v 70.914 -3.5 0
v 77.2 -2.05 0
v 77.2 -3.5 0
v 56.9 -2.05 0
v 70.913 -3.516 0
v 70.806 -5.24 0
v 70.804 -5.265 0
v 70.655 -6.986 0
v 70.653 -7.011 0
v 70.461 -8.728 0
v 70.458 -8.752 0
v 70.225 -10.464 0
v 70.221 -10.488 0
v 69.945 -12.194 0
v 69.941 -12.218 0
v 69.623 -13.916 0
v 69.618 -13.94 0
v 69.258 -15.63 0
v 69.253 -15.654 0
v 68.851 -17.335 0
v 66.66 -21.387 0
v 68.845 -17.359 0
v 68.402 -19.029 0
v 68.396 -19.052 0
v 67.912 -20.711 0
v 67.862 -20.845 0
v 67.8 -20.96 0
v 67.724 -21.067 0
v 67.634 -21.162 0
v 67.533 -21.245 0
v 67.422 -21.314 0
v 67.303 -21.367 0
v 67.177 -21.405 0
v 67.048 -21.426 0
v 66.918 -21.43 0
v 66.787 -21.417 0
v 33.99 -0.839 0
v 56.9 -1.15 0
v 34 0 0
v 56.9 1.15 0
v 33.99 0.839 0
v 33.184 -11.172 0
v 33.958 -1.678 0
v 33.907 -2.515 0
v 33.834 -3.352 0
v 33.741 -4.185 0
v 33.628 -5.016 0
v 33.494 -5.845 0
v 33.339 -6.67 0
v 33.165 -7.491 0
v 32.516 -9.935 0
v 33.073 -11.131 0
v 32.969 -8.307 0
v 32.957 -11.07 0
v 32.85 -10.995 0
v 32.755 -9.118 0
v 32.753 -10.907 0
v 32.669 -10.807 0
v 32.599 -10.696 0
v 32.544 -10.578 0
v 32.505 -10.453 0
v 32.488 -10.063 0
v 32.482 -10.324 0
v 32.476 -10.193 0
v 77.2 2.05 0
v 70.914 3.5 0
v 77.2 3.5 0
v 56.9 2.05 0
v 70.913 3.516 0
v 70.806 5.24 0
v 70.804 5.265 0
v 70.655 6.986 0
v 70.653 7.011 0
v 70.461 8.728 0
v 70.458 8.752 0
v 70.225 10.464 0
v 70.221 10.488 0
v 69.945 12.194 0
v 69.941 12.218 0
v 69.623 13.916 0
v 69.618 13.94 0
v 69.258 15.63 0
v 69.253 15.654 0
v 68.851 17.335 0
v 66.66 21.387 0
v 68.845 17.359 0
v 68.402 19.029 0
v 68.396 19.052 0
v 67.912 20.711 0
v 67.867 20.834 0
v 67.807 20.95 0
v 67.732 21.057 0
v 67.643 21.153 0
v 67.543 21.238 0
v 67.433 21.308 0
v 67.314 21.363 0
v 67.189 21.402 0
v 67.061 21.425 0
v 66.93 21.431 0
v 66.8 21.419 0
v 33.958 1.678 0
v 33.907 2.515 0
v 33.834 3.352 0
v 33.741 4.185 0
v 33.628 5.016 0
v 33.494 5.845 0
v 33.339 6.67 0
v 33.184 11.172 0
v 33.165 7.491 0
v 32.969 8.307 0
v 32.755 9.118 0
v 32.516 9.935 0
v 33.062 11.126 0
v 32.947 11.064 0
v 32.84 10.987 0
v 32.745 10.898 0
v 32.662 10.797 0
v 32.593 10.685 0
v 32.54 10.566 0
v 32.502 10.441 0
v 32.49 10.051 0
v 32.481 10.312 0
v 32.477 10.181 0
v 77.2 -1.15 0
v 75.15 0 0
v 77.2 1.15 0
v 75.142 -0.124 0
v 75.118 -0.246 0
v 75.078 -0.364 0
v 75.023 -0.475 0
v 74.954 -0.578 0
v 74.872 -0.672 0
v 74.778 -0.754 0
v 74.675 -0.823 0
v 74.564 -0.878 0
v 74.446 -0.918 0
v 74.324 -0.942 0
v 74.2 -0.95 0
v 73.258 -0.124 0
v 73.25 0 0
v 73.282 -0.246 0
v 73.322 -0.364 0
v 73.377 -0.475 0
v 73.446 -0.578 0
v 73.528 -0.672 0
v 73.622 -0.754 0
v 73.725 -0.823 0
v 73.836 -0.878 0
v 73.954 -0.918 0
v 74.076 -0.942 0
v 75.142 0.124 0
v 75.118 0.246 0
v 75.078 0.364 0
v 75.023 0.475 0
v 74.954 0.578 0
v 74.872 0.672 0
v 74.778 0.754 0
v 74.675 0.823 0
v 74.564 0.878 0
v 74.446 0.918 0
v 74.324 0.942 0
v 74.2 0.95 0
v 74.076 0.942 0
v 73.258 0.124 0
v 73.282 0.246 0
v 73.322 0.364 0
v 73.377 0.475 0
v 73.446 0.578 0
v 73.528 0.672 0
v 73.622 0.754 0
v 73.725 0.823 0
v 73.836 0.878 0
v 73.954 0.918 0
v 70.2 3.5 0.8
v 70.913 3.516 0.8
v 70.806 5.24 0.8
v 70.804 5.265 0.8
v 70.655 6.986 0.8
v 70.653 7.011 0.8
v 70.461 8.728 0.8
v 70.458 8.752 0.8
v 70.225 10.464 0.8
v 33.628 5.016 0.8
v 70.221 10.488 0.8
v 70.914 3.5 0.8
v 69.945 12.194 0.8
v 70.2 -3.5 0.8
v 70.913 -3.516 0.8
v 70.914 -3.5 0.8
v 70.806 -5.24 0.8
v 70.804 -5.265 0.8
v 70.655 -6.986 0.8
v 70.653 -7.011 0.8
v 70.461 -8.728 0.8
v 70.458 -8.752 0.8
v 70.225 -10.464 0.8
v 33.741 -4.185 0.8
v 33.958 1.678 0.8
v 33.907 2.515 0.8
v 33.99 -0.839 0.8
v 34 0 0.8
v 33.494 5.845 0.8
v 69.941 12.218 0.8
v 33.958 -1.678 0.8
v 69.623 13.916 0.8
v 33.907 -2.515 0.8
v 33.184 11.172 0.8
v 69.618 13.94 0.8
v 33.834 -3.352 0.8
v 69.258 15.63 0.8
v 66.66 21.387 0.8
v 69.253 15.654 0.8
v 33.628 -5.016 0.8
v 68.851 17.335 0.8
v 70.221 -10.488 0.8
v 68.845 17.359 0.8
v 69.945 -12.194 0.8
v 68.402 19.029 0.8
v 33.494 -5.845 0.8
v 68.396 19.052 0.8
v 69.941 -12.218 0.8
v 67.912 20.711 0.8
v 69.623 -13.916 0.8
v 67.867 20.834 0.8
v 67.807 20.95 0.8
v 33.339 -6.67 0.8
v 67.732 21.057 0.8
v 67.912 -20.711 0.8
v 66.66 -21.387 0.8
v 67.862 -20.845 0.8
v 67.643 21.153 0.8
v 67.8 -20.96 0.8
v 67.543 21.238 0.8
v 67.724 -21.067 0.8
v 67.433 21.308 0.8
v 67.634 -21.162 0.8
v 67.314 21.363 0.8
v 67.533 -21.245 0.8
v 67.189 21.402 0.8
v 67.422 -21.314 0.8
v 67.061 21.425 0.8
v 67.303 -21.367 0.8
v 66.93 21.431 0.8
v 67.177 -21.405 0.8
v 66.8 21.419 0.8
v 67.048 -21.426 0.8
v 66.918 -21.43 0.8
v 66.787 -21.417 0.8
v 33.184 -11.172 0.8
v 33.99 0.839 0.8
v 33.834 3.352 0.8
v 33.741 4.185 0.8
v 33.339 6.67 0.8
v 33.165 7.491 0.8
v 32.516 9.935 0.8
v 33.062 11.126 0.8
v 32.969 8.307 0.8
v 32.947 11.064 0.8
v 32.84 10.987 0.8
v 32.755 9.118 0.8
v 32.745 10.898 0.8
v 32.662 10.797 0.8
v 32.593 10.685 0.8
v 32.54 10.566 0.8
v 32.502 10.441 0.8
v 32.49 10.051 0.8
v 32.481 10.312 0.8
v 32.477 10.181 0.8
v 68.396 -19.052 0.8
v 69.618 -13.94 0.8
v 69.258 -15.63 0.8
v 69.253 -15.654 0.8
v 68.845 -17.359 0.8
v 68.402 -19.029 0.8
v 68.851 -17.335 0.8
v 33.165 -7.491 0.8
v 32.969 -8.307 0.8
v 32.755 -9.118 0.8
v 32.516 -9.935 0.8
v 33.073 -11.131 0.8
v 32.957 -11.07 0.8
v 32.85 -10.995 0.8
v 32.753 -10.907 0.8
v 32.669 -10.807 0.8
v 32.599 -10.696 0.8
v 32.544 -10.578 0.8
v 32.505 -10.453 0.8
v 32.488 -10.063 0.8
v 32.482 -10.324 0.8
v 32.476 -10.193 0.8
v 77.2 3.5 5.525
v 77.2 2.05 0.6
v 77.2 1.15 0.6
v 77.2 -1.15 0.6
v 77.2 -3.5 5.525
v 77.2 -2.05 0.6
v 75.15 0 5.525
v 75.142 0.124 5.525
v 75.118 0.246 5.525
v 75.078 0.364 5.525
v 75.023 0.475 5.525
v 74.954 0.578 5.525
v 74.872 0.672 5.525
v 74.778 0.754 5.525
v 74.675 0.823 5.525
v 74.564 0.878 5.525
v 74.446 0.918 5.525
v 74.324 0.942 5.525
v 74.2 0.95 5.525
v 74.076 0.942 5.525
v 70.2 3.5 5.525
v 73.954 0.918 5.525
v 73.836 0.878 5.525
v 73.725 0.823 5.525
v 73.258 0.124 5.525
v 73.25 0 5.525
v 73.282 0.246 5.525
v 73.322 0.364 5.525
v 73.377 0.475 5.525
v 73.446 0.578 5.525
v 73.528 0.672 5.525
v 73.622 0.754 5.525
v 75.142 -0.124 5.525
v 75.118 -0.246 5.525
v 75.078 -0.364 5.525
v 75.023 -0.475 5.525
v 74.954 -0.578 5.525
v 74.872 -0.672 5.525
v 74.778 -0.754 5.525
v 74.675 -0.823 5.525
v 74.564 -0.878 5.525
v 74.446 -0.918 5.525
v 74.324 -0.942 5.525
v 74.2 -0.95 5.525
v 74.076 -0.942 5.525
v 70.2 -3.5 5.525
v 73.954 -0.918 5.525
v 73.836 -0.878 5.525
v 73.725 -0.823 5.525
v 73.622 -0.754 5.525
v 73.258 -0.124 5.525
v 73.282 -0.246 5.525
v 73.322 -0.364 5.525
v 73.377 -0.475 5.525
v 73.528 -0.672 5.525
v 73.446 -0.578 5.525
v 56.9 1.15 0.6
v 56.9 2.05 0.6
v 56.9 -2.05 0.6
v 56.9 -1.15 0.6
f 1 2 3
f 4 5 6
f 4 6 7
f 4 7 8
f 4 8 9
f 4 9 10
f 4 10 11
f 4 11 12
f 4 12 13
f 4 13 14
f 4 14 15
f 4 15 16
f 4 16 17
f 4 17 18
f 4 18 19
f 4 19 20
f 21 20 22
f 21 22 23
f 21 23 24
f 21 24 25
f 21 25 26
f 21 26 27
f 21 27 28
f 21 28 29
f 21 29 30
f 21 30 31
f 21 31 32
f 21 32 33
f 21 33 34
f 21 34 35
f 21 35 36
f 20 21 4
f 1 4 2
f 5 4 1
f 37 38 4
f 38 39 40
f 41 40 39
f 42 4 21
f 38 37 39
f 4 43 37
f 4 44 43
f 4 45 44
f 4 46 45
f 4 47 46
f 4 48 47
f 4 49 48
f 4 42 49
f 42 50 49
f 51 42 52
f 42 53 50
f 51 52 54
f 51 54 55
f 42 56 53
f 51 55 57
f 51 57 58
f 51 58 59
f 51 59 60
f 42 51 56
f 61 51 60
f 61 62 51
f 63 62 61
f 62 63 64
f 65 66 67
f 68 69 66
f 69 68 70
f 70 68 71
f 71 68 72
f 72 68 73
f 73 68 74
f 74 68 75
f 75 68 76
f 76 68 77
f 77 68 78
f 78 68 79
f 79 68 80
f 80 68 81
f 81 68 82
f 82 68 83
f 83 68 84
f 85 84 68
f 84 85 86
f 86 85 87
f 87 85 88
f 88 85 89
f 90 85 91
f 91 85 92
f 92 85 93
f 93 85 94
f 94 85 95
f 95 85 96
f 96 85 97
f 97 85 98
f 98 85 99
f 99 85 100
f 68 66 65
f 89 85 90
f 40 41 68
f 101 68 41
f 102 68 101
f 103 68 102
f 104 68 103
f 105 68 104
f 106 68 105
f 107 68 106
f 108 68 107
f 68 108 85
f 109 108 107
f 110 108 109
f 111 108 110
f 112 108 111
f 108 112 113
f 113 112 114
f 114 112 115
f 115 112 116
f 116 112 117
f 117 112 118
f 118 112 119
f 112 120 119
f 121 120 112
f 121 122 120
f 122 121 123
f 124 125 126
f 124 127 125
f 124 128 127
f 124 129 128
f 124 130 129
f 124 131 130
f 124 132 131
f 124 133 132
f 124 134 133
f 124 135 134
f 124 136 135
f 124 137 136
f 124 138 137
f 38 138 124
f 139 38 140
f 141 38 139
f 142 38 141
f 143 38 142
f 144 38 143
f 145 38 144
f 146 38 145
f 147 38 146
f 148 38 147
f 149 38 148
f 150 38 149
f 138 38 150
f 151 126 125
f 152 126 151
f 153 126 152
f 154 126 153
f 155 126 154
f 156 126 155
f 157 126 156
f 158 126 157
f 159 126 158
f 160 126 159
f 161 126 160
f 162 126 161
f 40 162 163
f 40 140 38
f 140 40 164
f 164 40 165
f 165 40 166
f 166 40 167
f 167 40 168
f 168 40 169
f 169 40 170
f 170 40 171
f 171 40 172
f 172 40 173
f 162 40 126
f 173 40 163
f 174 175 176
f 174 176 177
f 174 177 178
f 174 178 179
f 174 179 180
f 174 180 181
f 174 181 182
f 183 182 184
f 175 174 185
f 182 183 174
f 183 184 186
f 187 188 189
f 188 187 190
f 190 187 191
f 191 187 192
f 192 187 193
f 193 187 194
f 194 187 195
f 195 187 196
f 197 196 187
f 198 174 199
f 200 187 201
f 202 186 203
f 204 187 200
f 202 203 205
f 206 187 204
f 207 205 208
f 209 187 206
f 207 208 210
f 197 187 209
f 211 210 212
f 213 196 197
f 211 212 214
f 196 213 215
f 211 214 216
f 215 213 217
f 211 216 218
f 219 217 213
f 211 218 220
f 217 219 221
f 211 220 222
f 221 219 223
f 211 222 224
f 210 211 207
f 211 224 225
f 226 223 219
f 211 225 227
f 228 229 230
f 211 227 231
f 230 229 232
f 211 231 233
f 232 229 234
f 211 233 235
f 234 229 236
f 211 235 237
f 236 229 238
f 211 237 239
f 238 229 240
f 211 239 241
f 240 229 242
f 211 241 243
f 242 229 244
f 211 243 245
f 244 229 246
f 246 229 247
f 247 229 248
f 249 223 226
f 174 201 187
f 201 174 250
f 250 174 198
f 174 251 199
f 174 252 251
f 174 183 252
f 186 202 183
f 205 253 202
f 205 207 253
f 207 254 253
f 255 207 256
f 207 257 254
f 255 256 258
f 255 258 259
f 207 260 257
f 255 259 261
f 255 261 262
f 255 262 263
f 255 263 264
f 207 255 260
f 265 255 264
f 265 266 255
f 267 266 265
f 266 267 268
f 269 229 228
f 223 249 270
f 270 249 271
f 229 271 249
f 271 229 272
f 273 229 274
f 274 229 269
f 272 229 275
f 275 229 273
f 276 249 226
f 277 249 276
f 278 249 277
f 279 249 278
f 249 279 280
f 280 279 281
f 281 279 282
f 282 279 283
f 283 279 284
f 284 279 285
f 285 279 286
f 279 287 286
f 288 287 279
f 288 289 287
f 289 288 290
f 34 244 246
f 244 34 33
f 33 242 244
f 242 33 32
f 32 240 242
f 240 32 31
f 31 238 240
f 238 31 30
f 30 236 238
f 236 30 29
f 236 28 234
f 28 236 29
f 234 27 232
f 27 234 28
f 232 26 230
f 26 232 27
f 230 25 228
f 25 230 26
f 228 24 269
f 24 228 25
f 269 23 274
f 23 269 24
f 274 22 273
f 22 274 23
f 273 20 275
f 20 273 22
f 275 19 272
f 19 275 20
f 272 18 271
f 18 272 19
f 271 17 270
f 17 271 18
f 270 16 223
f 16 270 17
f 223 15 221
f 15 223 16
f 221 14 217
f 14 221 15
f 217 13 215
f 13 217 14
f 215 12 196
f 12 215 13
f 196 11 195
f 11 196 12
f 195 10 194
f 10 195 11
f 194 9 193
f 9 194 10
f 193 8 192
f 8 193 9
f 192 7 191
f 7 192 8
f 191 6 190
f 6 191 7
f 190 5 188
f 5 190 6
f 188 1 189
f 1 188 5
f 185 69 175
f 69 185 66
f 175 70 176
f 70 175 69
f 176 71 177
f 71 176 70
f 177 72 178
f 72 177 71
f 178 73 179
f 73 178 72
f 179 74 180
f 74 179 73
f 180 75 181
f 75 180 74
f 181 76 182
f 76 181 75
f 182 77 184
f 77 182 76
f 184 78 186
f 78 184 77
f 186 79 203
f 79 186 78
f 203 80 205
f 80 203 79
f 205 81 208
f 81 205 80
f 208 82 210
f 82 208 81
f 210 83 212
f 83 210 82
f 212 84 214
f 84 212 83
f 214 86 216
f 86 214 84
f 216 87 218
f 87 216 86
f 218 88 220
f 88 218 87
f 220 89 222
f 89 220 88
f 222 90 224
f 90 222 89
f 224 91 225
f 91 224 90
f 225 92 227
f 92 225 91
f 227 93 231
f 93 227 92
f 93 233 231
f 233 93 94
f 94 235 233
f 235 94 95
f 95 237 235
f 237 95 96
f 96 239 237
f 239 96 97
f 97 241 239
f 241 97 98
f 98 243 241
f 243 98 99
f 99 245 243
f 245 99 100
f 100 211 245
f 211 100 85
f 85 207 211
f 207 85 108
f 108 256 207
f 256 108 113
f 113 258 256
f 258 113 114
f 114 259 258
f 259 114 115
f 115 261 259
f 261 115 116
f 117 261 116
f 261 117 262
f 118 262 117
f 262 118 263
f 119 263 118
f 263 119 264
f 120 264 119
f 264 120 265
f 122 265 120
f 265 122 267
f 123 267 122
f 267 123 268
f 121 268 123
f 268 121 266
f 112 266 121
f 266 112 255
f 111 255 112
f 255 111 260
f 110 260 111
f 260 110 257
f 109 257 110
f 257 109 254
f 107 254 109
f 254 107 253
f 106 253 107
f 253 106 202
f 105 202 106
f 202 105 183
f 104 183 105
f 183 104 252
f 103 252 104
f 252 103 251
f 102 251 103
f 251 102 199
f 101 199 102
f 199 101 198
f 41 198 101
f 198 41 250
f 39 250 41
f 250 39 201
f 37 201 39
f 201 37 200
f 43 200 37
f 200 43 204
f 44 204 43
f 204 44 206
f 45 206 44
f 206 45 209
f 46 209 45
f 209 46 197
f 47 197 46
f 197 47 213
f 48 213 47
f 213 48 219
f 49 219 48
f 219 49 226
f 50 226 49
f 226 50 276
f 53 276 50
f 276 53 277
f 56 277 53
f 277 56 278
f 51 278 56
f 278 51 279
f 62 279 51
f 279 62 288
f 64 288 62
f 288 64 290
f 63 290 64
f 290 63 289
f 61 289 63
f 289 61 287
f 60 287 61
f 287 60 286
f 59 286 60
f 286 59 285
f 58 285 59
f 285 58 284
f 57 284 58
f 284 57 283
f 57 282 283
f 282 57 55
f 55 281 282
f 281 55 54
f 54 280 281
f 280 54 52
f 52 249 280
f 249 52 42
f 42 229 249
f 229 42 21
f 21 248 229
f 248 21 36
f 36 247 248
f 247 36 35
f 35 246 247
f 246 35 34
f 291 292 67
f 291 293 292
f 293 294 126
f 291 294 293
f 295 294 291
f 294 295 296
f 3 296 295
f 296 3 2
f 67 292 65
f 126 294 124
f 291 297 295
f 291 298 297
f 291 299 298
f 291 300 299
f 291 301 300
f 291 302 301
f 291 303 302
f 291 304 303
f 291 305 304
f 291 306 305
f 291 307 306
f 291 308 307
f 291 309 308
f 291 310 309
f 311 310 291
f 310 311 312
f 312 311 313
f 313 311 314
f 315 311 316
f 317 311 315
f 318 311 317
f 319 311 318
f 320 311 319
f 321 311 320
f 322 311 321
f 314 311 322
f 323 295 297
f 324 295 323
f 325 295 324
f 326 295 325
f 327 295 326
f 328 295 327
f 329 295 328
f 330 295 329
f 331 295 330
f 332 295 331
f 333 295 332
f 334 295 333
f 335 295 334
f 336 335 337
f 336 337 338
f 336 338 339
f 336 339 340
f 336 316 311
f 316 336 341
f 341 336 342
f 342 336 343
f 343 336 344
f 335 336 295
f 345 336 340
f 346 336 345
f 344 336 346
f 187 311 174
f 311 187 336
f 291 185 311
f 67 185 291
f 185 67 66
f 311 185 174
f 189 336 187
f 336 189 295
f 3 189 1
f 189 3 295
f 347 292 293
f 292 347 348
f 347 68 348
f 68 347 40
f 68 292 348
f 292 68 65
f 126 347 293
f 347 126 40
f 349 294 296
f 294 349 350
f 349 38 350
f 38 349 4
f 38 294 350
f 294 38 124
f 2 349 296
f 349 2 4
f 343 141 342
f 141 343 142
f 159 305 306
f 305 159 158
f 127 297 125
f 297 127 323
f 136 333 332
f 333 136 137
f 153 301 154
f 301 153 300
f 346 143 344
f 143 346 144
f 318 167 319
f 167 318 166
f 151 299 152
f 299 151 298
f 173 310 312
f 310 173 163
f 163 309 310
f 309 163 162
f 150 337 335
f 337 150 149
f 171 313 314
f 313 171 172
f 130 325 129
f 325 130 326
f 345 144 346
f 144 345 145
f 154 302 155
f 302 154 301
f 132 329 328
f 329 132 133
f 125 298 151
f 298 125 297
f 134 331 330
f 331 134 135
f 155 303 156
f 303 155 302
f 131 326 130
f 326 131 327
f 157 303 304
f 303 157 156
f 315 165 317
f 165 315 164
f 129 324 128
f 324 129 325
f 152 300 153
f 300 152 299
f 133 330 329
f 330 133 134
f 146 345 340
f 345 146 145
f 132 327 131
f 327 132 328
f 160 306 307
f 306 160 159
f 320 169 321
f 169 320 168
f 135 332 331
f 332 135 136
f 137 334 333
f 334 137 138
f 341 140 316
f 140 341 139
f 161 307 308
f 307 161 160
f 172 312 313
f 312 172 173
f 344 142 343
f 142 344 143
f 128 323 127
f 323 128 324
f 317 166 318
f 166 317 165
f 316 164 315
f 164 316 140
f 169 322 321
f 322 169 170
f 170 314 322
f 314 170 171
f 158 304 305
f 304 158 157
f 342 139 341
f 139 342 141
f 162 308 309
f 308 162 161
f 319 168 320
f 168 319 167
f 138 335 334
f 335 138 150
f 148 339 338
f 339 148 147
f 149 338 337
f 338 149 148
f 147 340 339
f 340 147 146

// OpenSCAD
// file: parameters.scad
// =============================================================================
// Gen-BN — nightly 2026-10-06 (physics_scorer, honest magpylib watts)
// 8-pole / 9-coil (winding factor 0.945, smoother torque and lower cogging than 6-coil) on the Gen-BK R52 rotors/steel, re-wound dense at fill 0.65 with 9.45 mm copper on 35–70 mm bobbins — more turns per metre than Gen-BK at the same ~360 m wire.
// Clocking 0 deg (magnets N facing S) + D-flat keyed bore + index notch + flip-symmetric hole map.
// Windable 2-piece bobbin; turns = physics_scorer turns_fit; copper only between flanges.
// Steel back-iron: 2× Ø138 × 4.76 mm (3/16") mild-steel discs (steel_backiron_disc.dxf); magnets sit ON the steel
// (through-pockets) -> score with --back-iron.
// =============================================================================
topology            = "dual_rotor";

// --- Wire / winding (physics_scorer winding-fit) -------------------------------
wire_awg            = 26;
wire_od             = 0.45;     // insulated OD mm (bare 0.405)
fill_realistic      = 0.65;     // insulated-wire area / window (DENSE layered wind with a jig; scorer cap 0.65)
turns               = 486;       // = physics_scorer turns_fit (do NOT raise)
coil_former_type    = "bobbin";
coil_core_inset     = 12.60;     // radial copper build: hub = copper boundary inset by this
wind_build_axial    = 0.0;      // nothing proud of the flanges
wind_build_radial   = 0.0;

// --- Bobbin (base + lid) ---------------------------------------------------------
coil_id_r           = 35.00;    // copper boundary sector
coil_od_r           = 70.00;
span_deg            = 33.94;    // = pitch - 2*asin((wall+0.85)/coil_id_r) -> >=1.2 mm stator web
former_web          = 9.45;     // copper height between flanges (TALL copper: steel keeps Bz up)
flange_t            = 0.80;     // >= 0.8 mm FDM wall rule (tall winds push on the flanges)
wall                = 1.00;     // flange lip beyond copper
former_bare_h       = former_web + 2 * flange_t;
coil_envelope_h     = former_bare_h + 2 * wind_build_axial;
tab_w               = 7.0;
tab_len             = 7.0;
tab_h               = former_bare_h / 2;
pin_d               = 1.9;      // 1.75 mm filament locating pin
coil_mount_r        = coil_od_r + 0.2 + 4.0;
lead_y              = 1.6;
lead_slot_w         = 0.9;
lead_groove_d       = 0.6;

// --- Gap -------------------------------------------------------------------------
run_clear           = 0.50;     // rotor face -> flange
gap_spacer_h        = run_clear + wind_build_axial;
m2m                 = coil_envelope_h + 2 * run_clear;   // rotor face to rotor face (= gap_sleeve length)

// --- Stator ----------------------------------------------------------------------
coil_stations       = 9;
bay_clear           = 0.25;
stator_thick        = former_bare_h;                        // bobbins flush both faces
stator_od           = 160.0;
shaft_clear_stator  = 14.0;     // stator is static; gap sleeve OD 12 spins inside

// --- Rotor(s) --------------------------------------------------------------------
magnet_Br           = 1.43;     // N52
magnet_d_large      = 20.0;
magnet_h_large      = 5.0;      // one O20x5 per pocket
magnet_h_small      = 5.0;      // one O5x5 per pocket
halbach_magnetisation = "diametric"; // O5x5 assist magnets MUST be DIAMETRICALLY magnetised (tangential)
rotor_b_same_axis   = true;     // same-index magnets share one axis: N faces S across the gap
large_pocket_d      = 20.3;
small_pocket_d      = 5.3;
pocket_h            = 5.10;     // THROUGH the carrier: magnet back face sits on the steel disc
large_n             = 8;
R_large             = 52.0;
R_small_inner       = 41.0;
R_small_mid         = 52.0;
R_small_outer       = 63.0;
small_r_list        = [R_small_inner, R_small_mid, R_small_outer];   // O5 pockets between poles
carrier_od          = 138.0;
carrier_thick       = pocket_h;
hub_h               = 12.0;     // > steel_t + insert: radial set-screw clears the steel
hub_od              = 24.0;     // slim hub so the M4 brace rods fit at R~18 inside the coil ring
hub_insert_d        = 4.0;      // M3 heat-set insert, radial, bears on the D-flat
rotor_b_offset_deg  = 0.0;      // CLOCKING: magnets directly opposite
shaft_key           = "dflat";
dflat_depth         = 0.5;      // 8 mm shaft with 0.5 mm flat (7.5 across flat)
index_notch_d       = 3.0;

// --- Steel back-iron (buyable laser-cut) -------------------------------------------
steel_t             = 4.76;      // mild steel thickness (image method ignores it; sized from steel_flux.py so the return path stays well below saturation)
steel_center_hole   = 26.0;     // slips over the rotor hub (OD 24)
steel_od            = carrier_od;   // steel disc OD = rotor carrier OD

// --- Modular MAX interface ----------------------------------------------------------
shaft_bore          = 8.35;
dflat_x             = 4.0 - dflat_depth + (shaft_bore - 8.0) / 2;
bearing_d           = 21.85;
bearing_h           = 7.2;
m3_clear            = 3.5;
bolt_r_inner        = 30.0;     // M3 steel-disc clamp bolts (inside the magnet ring)
bolt_n_inner        = 4;
bolt_inner_angles   = [0, 90, 180, 270];
bolt_r_outer        = 65.0;     // M3 steel-disc clamp bolts (outside the magnet ring)
bolt_outer_angles   = [45, 135, 225, 315];
flange_bolt_r       = 75.0;     // frame rods: OUTSIDE the rotor OD (rotors spin inside them)
flange_bolt_n       = 9;
flange_bolt_offset  = 20.00;    // between coil stations -> never cuts a lead groove/tab
brace_r             = 18.0;
brace_d             = 4.3;      // temporary M4 jack rods (assembly only)
brace_n             = 4;
brace_angles        = [45, 135, 225, 315];          // flip-symmetric

spacer_pad_od       = 14.0;
spacer_pad_id       = m3_clear;
endbell_od          = 160.0;
endbell_thick       = 8.0;
endbell_shaft_clear = 10.0;
collar_h            = 10.0;
standoff_od         = 9.0;
frame_standoff_h    = run_clear + carrier_thick + hub_h + collar_h + 2.0;
sleeve_od           = 12.0;
plate_max_mm        = 410;

$fn = 64;
// main file
// Gen-BN — bobbin LID (top flange + locating tab). Print x9, flange face DOWN on the bed.
// CA-glue onto the hub top BEFORE winding. Tab = lap joint into the stator tab pocket; 1.75 mm filament
// pin through pin hole + stator ledge, trim flush. Lead slots carry both leads flush.
include <parameters.scad>;
$fn = 48;
module sector_2d(r_in, r_out, ang) {
    polygon([
        for (a = [-ang/2 : ang/24 : ang/2]) [r_in*cos(a), r_in*sin(a)],
        for (a = [ang/2 : -ang/24 : -ang/2]) [r_out*cos(a), r_out*sin(a)]
    ]);
}
module footprint_2d() { offset(r=wall) sector_2d(coil_id_r, coil_od_r, span_deg); }
module hub_2d()       { offset(delta=-coil_core_inset) sector_2d(coil_id_r, coil_od_r, span_deg); }

difference() {
    union() {
        linear_extrude(flange_t) footprint_2d();
        translate([coil_od_r + 0.2, -tab_w/2, 0]) cube([tab_len, tab_w, tab_h]);
    }
    translate([coil_mount_r, 0, -0.1]) cylinder(d=pin_d, h=tab_h + 1);
    for (y = [lead_y, -lead_y])
        translate([coil_od_r - coil_core_inset - 0.5, y - lead_slot_w/2, -0.1])
            cube([coil_core_inset + tab_len + 2, lead_slot_w, lead_groove_d + 0.1]);
}
